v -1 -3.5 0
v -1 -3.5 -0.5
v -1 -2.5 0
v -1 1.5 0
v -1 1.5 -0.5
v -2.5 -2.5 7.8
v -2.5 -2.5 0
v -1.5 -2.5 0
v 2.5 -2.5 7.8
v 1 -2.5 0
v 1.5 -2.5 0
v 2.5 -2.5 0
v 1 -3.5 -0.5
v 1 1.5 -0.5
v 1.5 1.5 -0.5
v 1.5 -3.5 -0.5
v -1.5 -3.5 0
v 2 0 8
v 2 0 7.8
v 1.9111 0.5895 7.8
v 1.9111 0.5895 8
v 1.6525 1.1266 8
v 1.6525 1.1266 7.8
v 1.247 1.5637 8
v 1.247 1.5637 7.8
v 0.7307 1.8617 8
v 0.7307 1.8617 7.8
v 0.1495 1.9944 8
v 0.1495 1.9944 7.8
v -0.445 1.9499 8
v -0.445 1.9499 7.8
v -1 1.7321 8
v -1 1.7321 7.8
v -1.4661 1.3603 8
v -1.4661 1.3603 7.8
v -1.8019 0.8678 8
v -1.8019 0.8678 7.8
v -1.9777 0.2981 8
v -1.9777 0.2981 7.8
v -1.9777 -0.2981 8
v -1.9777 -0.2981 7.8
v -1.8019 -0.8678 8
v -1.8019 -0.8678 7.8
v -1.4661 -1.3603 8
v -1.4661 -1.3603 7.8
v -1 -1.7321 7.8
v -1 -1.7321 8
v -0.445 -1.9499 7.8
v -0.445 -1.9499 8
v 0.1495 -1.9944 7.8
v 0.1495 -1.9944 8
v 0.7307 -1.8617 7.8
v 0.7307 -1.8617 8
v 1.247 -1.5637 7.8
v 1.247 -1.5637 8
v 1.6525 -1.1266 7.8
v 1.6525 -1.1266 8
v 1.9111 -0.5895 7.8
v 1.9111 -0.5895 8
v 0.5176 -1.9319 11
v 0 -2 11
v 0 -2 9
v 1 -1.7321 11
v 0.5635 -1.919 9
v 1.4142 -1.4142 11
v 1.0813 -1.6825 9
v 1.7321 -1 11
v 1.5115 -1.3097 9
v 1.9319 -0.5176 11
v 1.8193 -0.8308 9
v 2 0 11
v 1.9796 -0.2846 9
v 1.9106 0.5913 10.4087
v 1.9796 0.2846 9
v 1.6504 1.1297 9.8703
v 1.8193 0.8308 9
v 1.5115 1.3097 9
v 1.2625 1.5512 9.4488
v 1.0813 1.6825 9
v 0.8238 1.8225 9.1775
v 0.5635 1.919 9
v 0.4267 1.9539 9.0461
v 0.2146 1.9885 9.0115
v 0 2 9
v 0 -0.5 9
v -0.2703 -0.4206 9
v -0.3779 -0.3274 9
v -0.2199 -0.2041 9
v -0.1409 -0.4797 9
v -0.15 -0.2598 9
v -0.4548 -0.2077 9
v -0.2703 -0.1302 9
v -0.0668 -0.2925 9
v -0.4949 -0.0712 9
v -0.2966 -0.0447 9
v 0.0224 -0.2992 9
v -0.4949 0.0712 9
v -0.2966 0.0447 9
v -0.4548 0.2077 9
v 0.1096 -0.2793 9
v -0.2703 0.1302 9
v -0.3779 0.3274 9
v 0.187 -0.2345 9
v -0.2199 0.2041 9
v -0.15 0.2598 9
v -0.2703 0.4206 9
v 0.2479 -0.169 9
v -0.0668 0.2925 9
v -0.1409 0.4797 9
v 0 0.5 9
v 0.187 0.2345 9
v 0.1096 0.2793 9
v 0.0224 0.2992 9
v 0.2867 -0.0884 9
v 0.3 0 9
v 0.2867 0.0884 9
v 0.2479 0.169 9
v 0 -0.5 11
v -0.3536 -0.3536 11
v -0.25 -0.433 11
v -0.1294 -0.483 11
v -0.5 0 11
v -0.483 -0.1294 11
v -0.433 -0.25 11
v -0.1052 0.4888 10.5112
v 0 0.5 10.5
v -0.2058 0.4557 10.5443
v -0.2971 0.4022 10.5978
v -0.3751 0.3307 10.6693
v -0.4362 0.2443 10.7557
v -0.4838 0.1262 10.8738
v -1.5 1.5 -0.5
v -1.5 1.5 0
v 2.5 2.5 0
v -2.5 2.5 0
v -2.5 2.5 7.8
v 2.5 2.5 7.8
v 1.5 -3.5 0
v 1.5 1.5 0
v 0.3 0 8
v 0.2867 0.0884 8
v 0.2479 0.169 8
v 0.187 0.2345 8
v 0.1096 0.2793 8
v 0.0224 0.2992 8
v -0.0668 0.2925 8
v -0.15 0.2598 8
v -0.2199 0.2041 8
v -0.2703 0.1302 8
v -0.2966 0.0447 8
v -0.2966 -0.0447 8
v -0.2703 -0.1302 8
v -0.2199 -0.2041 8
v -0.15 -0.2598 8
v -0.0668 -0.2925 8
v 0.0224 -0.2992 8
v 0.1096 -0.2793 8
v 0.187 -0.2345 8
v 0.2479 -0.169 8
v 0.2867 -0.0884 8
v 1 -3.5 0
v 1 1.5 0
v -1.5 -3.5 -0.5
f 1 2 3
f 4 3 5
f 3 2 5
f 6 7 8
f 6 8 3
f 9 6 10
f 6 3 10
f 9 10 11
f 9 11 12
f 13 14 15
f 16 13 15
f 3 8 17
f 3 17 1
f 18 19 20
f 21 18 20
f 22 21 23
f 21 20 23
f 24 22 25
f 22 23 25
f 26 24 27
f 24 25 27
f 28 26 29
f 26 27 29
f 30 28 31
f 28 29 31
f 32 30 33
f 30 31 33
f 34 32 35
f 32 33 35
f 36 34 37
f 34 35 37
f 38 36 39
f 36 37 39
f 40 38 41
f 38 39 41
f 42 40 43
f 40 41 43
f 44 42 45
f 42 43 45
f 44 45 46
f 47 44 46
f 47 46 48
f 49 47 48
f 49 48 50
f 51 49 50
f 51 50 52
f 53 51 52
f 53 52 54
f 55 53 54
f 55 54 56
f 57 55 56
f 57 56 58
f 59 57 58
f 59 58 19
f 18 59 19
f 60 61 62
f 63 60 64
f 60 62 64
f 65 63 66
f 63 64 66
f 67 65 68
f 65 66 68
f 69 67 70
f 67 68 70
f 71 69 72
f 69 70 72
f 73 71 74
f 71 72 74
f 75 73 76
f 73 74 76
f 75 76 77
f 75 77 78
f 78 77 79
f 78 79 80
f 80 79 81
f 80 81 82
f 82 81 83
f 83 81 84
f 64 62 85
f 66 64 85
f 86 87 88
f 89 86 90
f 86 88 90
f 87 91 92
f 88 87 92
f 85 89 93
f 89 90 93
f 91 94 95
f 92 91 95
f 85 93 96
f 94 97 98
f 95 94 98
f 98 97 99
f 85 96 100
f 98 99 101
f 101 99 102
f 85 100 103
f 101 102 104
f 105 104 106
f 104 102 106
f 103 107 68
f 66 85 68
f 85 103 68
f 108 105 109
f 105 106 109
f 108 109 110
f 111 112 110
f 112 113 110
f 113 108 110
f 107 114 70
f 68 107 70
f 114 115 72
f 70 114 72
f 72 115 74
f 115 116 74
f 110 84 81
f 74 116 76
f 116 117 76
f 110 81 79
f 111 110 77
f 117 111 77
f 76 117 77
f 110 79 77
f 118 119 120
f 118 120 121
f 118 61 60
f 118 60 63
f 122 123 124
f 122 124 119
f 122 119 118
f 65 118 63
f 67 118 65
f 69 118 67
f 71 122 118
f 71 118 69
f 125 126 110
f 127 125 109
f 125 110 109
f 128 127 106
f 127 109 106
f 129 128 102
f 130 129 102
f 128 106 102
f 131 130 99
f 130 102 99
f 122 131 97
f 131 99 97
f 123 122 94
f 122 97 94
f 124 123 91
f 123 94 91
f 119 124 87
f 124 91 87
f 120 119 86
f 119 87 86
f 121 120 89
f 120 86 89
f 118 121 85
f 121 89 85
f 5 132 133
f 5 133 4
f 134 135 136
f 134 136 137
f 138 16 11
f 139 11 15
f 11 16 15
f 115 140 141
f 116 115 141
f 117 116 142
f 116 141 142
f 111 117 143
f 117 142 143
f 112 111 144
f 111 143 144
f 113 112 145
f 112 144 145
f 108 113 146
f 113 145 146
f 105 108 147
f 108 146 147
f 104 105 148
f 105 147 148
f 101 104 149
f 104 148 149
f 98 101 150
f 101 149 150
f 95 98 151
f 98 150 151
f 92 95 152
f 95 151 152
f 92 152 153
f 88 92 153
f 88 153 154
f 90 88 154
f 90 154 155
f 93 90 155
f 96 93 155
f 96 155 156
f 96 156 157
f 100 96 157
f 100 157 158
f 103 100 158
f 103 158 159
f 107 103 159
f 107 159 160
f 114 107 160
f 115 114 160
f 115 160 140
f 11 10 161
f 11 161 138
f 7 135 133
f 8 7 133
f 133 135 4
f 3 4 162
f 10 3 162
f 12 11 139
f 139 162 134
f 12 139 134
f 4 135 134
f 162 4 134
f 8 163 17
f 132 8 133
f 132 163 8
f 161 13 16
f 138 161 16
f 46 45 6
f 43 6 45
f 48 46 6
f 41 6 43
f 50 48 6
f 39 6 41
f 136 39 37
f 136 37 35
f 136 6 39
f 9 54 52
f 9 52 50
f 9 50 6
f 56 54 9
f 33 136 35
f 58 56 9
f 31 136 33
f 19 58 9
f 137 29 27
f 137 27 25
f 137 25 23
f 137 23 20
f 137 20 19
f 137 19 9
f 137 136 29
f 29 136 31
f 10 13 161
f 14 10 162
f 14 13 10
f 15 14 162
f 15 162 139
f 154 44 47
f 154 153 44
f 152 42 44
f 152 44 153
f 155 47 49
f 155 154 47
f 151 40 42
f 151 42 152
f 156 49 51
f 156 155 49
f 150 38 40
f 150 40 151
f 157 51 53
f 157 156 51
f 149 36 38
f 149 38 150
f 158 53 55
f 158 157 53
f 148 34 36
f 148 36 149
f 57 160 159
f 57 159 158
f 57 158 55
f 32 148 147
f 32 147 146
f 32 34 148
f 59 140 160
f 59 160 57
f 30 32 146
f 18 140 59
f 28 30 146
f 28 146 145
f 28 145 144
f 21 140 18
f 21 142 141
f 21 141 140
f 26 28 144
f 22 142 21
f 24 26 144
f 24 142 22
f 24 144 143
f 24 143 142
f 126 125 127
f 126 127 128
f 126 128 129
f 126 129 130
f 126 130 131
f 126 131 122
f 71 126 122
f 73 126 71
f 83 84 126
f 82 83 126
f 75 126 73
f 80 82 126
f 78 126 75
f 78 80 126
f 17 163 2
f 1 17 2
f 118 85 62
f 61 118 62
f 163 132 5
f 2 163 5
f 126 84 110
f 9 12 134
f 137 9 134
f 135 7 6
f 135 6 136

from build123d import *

# Parameters (mm, degrees)
BOX003_W          = 0.5
BOX003_H          = 5
BOX003_DEPTH      = 0.5
BOX001_W          = 5
BOX001_H          = 5
BOX001_DEPTH      = 7.8
BOX002_W          = 0.5
BOX002_H          = 5
BOX002_DEPTH      = 0.5
BOX_W             = 4
BOX_H             = 3
BOX_DEPTH         = 2
BOX_ROLL_ANGLE    = -45
CYLINDER001_R     = 0.3
CYLINDER001_DEPTH = 11
CYLINDER_R        = 2
CYLINDER_DEPTH    = 8
CYLINDER002_R     = 0.5
CYLINDER002_DEPTH = 2
PAD_DEPTH         = 2


with BuildPart() as w_rfel003:
    # Box003 → Box003 (new body)
    with BuildSketch(Plane(origin=(1, -3.5, -0.5), x_dir=(1, 0, 0), z_dir=(0, 0, 1))):
        with Locations((0.25, 2.5)):
            Rectangle(BOX003_W, BOX003_H)
    extrude(amount=BOX003_DEPTH)


with BuildPart() as w_rfel001:
    # Box001 → Box001 (new body)
    with BuildSketch(Plane(origin=(-2.5, -2.5, 0), x_dir=(1, 0, 0), z_dir=(0, 0, 1))):
        with Locations((2.5, 2.5)):
            Rectangle(BOX001_W, BOX001_H)
    extrude(amount=BOX001_DEPTH)


with BuildPart() as w_rfel002:
    # Box002 → Box002 (new body)
    with BuildSketch(Plane(origin=(-1.5, -3.5, -0.5), x_dir=(1, 0, 0), z_dir=(0, 0, 1))):
        with Locations((0.25, 2.5)):
            Rectangle(BOX002_W, BOX002_H)
    extrude(amount=BOX002_DEPTH)


with BuildPart() as w_rfel:
    # Box → Box (new body)
    with BuildSketch(Plane.XY):
        with Locations((2, 1.5)):
            Rectangle(BOX_W, BOX_H)
    extrude(amount=BOX_DEPTH)


with BuildPart() as w_rfel_1:
    # Box roll: moved
    add(w_rfel.part.rotate(Axis((0, 0, 0), (1, 0, 0)), BOX_ROLL_ANGLE))


with BuildPart() as w_rfel_2:
    # Box placement: moved
    add(w_rfel_1.part.moved(Location((-1, 0, 11))))


with BuildPart() as achse:
    # Cylinder001 → Cylinder001 (new body)
    with BuildSketch(Plane.XY):
        Circle(CYLINDER001_R)
    extrude(amount=CYLINDER001_DEPTH)


with BuildPart() as motor:
    # Cylinder → Cylinder (new body)
    with BuildSketch(Plane.XY):
        Circle(CYLINDER_R)
    extrude(amount=CYLINDER_DEPTH)


with BuildPart() as zylinder:
    # Cylinder002 → Cylinder002 (new body)
    with BuildSketch(Plane.XY.offset(9)):
        Circle(CYLINDER002_R)
    extrude(amount=CYLINDER002_DEPTH)


with BuildPart() as motor001:
    # Sketch → Pad (new body)
    with BuildSketch(Plane.XY.offset(9)):
        with BuildLine():
            Line((0, 2), (0, -2))
            ThreePointArc((0, -2), (2, 0), (0, 2))
        make_face()
    extrude(amount=PAD_DEPTH)

    # Fusion: union Achse, Motor, Zylinder
    add(achse.part)
    add(motor.part)
    add(zylinder.part)

    # Cut: cut Würfel
    add(w_rfel_2.part, mode=Mode.SUBTRACT)

    # Fusion001: union Würfel003, Würfel001, Würfel002
    add(w_rfel003.part)
    add(w_rfel001.part)
    add(w_rfel002.part)


solid = motor001.part
